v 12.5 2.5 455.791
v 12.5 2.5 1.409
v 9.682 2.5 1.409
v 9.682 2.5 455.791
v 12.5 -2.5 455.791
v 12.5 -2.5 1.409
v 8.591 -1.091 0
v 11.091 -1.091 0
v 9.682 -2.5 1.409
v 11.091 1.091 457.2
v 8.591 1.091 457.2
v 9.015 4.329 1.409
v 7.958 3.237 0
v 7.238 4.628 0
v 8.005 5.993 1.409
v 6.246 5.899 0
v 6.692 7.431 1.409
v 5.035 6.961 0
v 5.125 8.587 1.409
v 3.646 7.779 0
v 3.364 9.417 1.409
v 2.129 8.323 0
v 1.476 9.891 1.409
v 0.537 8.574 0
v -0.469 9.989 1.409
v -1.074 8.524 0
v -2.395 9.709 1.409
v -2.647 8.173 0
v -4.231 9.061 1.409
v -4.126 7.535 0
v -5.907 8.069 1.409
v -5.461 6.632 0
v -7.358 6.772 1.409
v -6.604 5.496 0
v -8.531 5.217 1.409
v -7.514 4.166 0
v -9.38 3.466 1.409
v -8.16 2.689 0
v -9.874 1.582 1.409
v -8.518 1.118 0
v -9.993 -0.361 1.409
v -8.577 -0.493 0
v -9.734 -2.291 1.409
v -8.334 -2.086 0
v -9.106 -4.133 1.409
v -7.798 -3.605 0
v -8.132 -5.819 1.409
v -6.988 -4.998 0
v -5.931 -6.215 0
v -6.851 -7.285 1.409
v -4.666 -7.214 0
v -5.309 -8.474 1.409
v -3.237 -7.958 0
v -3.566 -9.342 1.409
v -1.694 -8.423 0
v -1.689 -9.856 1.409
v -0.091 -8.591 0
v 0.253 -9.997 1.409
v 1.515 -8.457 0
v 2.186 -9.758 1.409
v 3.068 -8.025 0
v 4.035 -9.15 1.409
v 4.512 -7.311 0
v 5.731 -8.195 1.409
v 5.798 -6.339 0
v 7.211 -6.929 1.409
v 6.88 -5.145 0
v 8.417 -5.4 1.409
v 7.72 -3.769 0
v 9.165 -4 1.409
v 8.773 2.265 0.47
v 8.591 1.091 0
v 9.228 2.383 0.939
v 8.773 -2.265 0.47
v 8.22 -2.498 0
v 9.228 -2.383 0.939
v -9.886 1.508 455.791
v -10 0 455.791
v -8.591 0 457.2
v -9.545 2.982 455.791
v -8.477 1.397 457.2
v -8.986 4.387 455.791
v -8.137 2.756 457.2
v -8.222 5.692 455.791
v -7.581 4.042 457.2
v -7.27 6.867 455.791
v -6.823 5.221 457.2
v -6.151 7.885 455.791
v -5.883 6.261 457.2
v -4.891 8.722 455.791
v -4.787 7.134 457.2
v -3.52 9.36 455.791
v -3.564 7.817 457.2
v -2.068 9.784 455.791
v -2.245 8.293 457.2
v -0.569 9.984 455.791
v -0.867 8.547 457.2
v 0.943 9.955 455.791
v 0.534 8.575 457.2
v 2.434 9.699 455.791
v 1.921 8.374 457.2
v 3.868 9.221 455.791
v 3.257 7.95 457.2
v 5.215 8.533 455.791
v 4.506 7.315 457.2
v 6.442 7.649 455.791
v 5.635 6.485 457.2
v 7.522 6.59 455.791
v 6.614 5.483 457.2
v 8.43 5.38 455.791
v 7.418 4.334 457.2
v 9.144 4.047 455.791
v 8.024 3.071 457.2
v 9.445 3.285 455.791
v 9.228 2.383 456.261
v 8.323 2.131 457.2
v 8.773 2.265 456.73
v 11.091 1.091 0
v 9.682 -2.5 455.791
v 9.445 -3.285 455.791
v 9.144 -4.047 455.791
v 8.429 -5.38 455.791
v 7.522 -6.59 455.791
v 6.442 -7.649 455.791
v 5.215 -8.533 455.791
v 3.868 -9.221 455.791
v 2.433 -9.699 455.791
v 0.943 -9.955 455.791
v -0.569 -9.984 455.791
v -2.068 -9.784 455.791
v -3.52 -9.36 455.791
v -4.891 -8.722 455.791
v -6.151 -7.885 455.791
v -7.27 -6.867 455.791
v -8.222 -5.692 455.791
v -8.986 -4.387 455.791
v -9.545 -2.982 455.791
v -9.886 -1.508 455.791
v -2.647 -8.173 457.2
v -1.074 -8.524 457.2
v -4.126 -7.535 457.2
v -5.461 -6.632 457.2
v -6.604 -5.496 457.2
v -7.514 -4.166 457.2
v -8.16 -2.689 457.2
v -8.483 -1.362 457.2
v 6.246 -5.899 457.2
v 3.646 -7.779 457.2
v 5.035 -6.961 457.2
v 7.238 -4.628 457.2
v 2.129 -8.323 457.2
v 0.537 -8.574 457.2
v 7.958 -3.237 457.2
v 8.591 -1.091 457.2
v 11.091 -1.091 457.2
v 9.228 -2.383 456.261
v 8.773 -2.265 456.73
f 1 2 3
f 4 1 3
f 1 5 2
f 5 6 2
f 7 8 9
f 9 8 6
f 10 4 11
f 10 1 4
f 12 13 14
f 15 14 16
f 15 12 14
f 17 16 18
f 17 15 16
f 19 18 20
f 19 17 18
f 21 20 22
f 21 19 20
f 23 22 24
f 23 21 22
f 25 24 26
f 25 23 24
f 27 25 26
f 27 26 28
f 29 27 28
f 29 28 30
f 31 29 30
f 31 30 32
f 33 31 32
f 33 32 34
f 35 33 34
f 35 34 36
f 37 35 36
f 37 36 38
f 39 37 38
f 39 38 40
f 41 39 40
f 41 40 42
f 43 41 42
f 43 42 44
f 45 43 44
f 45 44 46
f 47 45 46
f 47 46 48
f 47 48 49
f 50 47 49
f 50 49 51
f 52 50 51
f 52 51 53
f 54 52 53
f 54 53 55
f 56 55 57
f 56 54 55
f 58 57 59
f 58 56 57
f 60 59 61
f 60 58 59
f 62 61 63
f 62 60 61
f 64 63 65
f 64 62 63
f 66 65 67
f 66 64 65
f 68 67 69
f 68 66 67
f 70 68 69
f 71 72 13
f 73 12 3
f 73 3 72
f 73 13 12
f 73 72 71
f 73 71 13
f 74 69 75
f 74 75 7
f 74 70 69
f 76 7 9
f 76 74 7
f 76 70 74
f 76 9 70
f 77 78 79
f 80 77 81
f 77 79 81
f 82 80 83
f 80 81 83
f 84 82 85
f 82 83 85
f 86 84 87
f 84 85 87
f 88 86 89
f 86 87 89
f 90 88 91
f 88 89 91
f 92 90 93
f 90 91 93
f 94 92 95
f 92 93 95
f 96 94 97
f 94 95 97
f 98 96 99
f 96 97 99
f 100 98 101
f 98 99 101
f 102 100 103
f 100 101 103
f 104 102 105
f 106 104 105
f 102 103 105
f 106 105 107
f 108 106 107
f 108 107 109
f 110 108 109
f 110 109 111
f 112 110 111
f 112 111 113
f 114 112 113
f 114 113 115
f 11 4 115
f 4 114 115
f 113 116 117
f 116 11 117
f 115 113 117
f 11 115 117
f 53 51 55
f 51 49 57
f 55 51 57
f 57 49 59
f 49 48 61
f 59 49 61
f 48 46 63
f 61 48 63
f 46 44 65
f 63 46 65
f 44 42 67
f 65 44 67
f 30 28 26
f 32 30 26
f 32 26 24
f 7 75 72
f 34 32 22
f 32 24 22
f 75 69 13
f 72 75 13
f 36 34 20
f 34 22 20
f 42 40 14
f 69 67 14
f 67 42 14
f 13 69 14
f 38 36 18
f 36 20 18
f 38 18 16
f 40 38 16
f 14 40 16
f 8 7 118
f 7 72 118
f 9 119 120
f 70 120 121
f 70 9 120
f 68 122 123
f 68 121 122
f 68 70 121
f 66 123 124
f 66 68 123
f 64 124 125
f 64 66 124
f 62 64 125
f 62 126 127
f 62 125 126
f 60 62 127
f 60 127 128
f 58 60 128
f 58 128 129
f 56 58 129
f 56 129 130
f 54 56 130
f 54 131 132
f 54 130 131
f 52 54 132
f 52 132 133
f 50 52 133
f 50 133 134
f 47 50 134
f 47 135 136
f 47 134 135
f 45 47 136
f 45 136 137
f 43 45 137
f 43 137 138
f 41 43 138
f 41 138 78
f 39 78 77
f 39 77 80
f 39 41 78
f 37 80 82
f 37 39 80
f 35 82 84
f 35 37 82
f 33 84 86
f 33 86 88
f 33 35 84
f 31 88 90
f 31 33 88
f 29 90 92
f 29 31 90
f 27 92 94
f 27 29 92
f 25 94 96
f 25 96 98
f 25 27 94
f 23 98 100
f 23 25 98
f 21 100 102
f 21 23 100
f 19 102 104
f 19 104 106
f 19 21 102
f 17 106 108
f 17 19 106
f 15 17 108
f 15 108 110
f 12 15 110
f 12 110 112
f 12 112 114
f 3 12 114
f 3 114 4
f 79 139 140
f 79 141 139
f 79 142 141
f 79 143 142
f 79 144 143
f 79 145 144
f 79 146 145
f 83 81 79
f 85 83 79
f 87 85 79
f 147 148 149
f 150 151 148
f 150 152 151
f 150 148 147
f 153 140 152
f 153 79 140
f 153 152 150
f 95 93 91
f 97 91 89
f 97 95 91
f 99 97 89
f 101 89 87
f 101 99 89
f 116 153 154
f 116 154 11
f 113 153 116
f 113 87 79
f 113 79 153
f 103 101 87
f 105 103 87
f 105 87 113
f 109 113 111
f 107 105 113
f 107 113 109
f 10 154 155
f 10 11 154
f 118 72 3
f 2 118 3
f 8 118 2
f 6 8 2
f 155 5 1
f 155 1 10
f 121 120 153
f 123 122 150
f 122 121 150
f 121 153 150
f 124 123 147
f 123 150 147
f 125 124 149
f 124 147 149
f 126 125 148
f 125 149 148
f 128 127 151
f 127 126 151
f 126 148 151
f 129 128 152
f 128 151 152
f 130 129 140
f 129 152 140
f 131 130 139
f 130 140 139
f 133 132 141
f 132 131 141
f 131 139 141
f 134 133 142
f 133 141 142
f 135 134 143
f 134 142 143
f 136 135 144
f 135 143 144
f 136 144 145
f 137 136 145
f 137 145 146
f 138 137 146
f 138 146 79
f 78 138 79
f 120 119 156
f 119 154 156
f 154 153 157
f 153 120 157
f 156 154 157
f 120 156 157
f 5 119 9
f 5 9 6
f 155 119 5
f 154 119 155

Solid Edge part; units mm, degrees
sketch "Sketch1" plane through (0, 0, 0) normal (0, 0, 1) x (1, 0, 0)
  line L0 (12.5, 2.5) -> (9.6825, 2.5)
  line L1 (12.5, -2.5) -> (12.5, 2.5)
  line L2 (9.6825, -2.5) -> (12.5, -2.5)
  arc A0 (9.6825, -2.5) -> (9.6825, 2.5) centre (0, 0) cw
extrude "Protrusion1" add sketch "Sketch1" along normal blind 457.2
sketch "Sketch2" plane through (0, 0, 0) normal (0, 0, 1) x (1, 0, 0)
  line L0 (12.5, 2.5) -> (9.6825, 2.5)
  line L1 (12.5, -2.5) -> (12.5, 2.5)
  line L2 (9.6825, -2.5) -> (12.5, -2.5)
  arc A0 (9.6825, -2.5) -> (9.6825, 2.5) centre (0, 0) cw
sketch "Sketch3" plane through (0, 0, 0) normal (0, -1, 0) x (1, 0, 0)
  line L0 (11.0912, 0) -> (12.5, 1.4088)
  line L1 (12.5, 1.4088) -> (12.5, 0)
  line L2 (12.5, 0) -> (11.0912, 0)
sweep "SweptCutout_1" cut profiles "Sketch3" path "Sketch2"
sketch "Sketch4" plane through (0, 0, 0) normal (0, -1, 0) x (1, 0, 0)
  line L0 (12.5, 457.2) -> (12.5, 455.7912)
  line L1 (11.0912, 457.2) -> (12.5, 455.7912)
  line L2 (11.0912, 457.2) -> (12.5, 457.2)
sketch3d "SweptCutout_2 path"
  arc A0 (9.6825, -2.5, 457.2) -> (-10, 0, 457.2) centre (0, 0, 457.2)
  arc A1 (-10, 0, 457.2) -> (9.6825, 2.5, 457.2) centre (0, 0, 457.2)
  line L2 (9.6825, -2.5, 457.2) -> (12.5, -2.5, 457.2)
  line L3 (12.5, -2.5, 457.2) -> (12.5, 2.5, 457.2)
  line L4 (12.5, 2.5, 457.2) -> (9.6825, 2.5, 457.2)
sweep "SweptCutout_2" cut profiles "Sketch4" path "SweptCutout_2 path"
